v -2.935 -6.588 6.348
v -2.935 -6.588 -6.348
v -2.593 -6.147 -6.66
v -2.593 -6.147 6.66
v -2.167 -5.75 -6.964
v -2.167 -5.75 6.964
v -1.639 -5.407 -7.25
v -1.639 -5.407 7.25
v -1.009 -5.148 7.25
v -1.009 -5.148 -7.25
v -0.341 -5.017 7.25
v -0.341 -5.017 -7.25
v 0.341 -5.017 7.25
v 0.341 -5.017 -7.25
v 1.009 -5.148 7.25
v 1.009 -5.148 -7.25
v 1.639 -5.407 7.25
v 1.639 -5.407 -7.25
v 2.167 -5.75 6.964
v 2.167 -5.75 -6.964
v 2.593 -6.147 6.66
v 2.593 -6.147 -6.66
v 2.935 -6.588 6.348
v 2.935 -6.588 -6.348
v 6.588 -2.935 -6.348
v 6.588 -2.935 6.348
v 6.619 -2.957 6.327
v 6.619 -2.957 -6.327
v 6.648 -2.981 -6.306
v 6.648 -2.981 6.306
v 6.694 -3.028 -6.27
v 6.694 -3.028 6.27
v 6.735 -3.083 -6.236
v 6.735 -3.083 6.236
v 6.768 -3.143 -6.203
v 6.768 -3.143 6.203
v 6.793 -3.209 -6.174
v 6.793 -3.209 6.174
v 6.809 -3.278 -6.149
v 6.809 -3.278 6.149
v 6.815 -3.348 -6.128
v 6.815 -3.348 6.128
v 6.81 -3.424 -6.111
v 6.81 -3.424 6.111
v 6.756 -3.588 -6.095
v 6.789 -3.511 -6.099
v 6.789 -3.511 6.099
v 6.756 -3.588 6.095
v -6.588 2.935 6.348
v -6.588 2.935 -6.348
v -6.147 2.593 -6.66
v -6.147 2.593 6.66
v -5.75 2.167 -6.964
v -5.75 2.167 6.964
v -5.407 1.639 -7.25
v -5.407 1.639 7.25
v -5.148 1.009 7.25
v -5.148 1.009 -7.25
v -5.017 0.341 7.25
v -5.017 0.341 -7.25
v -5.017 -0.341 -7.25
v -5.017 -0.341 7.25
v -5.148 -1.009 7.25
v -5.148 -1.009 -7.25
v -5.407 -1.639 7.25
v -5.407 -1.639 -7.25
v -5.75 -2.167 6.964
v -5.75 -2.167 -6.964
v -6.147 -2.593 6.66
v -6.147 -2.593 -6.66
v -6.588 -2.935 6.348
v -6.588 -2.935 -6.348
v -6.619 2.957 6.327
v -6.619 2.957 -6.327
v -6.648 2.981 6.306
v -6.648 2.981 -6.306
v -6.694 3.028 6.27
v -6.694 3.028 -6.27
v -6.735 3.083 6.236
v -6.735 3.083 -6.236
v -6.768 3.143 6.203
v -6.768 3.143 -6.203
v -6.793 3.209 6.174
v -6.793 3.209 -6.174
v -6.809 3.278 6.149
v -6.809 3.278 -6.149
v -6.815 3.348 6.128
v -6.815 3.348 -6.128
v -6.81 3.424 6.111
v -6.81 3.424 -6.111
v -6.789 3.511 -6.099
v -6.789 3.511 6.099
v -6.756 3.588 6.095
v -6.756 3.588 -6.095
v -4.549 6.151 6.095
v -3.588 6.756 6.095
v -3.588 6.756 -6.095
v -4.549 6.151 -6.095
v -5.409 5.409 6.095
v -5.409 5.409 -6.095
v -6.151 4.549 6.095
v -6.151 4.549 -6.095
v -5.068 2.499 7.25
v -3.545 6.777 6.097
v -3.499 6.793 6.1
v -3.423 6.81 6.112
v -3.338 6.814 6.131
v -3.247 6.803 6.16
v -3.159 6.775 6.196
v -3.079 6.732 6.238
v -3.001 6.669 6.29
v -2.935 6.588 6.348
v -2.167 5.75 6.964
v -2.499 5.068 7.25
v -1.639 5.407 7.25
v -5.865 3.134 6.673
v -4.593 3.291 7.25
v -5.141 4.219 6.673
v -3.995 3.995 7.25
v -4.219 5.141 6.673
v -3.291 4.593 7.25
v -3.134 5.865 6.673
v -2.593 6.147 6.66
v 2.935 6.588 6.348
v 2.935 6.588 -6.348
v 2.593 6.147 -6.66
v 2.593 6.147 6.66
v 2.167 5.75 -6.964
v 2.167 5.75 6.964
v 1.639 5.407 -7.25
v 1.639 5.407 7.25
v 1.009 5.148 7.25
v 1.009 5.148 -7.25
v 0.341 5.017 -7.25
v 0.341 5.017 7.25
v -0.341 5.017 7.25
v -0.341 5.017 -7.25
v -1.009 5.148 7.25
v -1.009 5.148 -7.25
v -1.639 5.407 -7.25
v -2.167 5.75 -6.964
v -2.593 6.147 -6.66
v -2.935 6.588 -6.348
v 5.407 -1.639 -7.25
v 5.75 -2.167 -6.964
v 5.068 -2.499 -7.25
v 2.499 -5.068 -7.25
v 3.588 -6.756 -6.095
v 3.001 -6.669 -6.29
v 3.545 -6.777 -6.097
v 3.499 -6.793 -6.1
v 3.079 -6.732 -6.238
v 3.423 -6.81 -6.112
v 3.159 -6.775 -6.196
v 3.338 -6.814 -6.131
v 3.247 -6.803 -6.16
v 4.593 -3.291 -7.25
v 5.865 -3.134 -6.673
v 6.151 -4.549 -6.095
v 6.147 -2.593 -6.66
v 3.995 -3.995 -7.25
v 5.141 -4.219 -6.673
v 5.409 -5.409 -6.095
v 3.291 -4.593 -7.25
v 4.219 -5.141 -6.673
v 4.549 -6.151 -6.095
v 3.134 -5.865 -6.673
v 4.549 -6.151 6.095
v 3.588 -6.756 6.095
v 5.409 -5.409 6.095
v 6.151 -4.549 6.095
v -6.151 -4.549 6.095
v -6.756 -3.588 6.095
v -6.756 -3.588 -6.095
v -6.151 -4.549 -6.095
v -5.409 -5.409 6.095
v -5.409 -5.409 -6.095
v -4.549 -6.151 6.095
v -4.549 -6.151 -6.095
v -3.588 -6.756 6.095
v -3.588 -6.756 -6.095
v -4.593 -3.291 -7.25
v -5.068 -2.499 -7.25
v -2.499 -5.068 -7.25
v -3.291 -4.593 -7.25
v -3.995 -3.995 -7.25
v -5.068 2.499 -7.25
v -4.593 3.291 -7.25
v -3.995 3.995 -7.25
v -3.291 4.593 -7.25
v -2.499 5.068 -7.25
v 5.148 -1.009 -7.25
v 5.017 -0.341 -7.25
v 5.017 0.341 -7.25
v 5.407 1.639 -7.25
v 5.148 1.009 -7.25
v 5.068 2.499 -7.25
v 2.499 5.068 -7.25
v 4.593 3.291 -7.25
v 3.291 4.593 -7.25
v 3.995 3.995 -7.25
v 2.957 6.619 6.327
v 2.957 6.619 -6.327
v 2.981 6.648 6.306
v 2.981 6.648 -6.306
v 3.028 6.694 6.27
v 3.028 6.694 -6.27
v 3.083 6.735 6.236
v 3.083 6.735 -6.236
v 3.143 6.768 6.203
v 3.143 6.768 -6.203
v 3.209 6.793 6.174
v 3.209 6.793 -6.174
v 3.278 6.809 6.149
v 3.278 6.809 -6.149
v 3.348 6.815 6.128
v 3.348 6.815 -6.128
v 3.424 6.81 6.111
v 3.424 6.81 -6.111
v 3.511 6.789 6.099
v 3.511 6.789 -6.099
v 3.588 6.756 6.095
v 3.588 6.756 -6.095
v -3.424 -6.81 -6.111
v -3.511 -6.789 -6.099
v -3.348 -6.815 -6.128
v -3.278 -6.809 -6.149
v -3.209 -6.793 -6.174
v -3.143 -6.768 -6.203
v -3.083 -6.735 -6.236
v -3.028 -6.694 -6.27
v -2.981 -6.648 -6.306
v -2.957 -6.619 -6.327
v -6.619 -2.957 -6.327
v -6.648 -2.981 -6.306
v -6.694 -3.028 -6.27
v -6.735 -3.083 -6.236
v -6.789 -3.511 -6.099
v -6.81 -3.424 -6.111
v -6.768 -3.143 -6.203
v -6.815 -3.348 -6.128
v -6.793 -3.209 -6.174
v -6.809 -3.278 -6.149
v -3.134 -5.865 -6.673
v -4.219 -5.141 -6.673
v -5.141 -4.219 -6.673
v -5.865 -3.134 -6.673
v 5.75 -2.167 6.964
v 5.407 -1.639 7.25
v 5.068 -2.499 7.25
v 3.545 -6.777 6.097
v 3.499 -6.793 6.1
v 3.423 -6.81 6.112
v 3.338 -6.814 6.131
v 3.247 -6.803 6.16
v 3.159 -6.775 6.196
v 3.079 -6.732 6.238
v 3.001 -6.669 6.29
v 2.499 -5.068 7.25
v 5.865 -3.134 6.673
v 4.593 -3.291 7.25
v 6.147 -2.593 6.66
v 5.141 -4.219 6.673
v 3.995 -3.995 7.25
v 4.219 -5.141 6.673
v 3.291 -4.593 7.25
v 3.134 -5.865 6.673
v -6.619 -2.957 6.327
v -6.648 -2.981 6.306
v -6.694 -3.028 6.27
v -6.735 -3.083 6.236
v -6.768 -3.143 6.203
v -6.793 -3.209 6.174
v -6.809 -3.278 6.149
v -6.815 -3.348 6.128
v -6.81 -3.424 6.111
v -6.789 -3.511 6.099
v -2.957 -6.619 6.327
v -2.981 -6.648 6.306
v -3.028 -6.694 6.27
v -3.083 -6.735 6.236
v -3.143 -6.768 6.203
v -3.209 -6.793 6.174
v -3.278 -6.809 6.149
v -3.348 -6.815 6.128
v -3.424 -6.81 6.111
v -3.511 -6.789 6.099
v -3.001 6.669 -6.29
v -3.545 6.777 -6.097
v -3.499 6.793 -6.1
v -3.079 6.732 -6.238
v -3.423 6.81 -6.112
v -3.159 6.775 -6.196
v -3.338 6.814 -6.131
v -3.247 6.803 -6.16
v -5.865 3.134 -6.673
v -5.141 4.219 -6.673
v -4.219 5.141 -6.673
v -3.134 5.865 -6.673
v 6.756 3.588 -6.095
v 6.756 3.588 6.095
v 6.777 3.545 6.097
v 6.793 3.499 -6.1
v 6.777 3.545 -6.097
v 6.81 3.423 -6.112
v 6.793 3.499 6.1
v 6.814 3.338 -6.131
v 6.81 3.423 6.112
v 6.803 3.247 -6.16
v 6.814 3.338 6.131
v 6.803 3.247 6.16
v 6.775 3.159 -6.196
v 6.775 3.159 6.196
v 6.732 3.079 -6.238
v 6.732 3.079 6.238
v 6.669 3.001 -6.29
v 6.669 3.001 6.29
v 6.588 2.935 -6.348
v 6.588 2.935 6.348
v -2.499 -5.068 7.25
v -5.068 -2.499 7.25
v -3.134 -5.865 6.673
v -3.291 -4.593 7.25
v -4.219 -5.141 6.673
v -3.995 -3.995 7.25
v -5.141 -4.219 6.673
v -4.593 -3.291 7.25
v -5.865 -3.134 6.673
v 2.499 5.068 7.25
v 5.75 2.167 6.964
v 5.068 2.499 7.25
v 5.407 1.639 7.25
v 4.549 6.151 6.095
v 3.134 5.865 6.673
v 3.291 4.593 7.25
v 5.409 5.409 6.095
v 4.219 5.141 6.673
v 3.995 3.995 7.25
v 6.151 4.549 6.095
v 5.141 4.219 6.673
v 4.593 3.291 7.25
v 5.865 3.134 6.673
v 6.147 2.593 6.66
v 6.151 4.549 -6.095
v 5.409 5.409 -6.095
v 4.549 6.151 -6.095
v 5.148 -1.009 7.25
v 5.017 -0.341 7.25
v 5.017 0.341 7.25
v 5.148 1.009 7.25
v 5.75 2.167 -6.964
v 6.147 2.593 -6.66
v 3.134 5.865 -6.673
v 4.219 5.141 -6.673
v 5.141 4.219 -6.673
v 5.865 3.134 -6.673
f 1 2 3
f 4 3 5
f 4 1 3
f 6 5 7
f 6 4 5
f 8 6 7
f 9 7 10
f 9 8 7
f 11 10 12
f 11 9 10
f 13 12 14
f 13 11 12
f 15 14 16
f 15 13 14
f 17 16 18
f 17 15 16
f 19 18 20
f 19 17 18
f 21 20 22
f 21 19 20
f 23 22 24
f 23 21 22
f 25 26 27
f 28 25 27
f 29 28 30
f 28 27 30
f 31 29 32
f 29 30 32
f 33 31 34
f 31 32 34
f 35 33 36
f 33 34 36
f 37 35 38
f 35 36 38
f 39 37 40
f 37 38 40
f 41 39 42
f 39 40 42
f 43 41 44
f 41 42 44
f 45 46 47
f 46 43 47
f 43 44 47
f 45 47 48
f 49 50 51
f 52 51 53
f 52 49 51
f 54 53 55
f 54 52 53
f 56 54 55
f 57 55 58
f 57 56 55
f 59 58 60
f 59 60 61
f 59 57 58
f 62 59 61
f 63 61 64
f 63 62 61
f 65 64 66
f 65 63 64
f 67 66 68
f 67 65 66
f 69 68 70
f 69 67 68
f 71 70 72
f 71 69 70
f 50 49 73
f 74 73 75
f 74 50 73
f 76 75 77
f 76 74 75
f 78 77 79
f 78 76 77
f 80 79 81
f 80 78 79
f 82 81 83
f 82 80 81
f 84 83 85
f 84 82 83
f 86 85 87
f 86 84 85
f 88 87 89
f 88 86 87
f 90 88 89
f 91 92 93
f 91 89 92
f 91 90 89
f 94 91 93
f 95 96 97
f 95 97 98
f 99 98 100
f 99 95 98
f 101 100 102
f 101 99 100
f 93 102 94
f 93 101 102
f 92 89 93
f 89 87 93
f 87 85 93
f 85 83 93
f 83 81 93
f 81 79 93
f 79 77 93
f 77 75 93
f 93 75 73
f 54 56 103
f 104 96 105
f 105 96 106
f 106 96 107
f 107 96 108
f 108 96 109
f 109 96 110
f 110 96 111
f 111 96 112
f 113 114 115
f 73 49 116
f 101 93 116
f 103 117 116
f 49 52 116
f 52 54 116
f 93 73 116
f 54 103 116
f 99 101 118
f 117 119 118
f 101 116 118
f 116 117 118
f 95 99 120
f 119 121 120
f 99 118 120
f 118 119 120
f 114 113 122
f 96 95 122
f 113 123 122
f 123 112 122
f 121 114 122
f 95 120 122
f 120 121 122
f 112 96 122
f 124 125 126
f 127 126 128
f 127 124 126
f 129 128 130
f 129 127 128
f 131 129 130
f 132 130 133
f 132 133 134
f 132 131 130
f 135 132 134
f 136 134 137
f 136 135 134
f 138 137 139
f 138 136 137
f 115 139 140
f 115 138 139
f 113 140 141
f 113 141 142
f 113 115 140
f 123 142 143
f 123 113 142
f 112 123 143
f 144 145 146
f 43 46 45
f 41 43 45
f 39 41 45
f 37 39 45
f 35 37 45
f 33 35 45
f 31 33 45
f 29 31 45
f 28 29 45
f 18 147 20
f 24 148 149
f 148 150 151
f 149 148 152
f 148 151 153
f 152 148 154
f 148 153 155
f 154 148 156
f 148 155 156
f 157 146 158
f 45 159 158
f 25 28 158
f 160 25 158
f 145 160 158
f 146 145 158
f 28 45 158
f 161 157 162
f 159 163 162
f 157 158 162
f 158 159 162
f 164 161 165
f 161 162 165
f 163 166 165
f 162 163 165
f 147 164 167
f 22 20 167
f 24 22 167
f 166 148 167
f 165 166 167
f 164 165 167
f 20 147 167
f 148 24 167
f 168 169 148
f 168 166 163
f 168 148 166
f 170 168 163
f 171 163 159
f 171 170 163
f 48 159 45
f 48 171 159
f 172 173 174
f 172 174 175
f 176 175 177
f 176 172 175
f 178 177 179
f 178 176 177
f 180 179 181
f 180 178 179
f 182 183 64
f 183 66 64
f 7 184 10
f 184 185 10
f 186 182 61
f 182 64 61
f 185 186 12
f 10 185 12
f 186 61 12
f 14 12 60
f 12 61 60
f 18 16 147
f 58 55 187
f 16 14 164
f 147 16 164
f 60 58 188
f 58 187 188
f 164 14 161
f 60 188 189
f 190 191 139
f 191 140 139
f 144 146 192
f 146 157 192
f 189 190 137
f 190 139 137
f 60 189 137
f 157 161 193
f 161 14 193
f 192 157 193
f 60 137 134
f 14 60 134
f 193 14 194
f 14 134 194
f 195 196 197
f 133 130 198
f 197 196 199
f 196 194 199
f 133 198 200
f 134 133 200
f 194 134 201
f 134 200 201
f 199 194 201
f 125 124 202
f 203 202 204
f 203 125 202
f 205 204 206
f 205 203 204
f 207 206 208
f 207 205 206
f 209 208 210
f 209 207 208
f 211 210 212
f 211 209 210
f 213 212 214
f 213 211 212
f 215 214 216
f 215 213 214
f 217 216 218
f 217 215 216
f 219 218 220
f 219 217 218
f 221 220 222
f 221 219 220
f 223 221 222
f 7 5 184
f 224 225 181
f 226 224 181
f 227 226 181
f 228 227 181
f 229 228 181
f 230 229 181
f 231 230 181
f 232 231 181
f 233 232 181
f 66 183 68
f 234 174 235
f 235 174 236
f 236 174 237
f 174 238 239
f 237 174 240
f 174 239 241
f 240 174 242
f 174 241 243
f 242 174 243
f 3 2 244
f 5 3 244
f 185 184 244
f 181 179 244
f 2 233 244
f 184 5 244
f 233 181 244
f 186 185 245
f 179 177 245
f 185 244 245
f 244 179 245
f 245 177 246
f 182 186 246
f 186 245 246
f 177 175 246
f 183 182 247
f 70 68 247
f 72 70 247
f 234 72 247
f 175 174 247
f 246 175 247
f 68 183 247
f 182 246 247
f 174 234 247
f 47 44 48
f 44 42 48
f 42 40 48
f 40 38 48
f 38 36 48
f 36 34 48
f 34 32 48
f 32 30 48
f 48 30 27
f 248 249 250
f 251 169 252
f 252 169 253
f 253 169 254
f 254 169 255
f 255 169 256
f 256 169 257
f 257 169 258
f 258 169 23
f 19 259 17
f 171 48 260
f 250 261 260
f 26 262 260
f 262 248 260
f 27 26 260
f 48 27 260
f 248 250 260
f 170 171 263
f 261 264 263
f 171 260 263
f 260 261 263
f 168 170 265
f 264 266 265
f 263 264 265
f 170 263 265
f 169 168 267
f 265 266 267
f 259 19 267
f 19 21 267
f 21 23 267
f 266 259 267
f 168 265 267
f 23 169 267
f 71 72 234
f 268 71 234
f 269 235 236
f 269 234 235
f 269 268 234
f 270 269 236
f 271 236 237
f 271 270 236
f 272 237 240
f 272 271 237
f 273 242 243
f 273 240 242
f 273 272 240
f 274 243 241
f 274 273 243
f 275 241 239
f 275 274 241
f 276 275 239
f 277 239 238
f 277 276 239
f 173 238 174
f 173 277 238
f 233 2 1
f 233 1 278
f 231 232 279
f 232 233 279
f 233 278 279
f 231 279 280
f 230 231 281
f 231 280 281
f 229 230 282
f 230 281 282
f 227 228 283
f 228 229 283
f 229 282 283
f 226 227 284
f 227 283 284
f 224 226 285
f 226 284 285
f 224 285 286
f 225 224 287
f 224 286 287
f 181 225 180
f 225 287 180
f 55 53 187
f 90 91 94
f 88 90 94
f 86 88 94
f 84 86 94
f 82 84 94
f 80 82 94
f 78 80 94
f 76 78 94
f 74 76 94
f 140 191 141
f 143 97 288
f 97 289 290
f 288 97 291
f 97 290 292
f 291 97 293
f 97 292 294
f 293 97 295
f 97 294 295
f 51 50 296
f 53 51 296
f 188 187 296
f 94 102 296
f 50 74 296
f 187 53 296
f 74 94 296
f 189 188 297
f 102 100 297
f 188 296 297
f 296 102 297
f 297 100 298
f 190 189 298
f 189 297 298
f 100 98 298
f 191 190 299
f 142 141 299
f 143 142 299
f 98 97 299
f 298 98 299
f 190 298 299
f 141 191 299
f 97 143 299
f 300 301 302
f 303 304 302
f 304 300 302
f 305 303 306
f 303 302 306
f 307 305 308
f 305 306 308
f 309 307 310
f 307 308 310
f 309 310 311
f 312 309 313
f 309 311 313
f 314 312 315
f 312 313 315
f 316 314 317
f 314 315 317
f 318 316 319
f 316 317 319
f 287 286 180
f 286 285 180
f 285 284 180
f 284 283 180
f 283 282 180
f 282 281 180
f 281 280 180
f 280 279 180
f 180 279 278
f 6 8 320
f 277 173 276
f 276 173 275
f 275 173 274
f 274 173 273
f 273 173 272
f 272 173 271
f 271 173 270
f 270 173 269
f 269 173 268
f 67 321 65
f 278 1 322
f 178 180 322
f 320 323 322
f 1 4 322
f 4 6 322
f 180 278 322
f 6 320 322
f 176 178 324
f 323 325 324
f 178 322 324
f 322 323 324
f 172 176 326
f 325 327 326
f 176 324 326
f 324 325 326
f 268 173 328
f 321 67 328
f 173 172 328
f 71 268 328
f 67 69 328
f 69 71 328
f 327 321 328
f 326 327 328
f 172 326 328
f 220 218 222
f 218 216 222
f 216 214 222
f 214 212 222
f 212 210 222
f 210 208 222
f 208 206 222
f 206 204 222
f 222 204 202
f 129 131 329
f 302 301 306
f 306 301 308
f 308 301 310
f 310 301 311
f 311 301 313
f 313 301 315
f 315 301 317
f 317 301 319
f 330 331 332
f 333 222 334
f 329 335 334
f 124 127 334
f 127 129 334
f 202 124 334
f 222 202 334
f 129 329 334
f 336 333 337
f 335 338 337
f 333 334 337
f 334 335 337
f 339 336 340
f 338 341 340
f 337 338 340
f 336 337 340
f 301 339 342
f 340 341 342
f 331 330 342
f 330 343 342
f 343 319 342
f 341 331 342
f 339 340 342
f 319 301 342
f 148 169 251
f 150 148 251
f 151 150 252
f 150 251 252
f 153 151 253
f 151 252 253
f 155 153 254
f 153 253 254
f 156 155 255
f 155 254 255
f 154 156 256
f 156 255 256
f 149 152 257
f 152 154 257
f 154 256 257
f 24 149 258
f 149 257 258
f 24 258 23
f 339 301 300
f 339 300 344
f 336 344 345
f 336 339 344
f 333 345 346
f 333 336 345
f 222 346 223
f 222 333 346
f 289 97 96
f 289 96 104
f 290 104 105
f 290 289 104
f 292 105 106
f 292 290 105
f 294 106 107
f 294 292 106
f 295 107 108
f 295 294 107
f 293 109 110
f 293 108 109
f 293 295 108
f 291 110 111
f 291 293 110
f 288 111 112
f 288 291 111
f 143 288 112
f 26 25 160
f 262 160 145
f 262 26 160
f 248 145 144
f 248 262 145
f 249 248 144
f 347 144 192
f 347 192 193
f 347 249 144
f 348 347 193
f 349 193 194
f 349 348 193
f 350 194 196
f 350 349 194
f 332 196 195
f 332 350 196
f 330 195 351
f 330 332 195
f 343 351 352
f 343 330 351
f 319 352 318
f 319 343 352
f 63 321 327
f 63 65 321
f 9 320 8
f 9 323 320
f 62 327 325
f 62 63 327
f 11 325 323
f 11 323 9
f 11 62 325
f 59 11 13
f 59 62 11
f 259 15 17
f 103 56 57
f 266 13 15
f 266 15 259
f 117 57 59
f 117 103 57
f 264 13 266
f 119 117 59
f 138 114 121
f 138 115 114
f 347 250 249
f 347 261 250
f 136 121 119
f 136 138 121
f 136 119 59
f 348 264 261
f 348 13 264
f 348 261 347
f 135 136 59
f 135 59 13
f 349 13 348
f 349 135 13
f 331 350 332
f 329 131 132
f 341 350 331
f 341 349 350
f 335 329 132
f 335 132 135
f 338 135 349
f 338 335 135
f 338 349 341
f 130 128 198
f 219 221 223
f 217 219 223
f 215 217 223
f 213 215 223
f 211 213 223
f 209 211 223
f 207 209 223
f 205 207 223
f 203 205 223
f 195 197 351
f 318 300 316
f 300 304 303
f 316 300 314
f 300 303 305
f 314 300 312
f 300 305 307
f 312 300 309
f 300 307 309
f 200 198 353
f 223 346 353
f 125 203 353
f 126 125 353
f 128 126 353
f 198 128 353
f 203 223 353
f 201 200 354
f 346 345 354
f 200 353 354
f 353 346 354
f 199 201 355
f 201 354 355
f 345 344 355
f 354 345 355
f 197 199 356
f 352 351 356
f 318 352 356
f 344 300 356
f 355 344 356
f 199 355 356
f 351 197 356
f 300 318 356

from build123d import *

# Parameters (mm, degrees)
F1_DEPTH = 7.25
F2_R     = 0.5


with BuildPart() as f1:
    # F0 (on Top) → F1 (new body, symmetric)
    with BuildSketch(Plane.XY):
        with BuildLine():
            ThreePointArc((-6.9704381548, 3.1520615364), (-5, 0), (-6.9704381548, -3.1520615364))
            ThreePointArc((-6.9704381548, -3.1520615364), (-5.4093668761, -5.4093668761), (-3.1520615364, -6.9704381548))
            ThreePointArc((-3.1520615364, -6.9704381548), (0, -5), (3.1520615364, -6.9704381548))
            ThreePointArc((3.1520615364, -6.9704381548), (5.4093668761, -5.4093668761), (6.9704381548, -3.1520615364))
            ThreePointArc((6.9704381548, -3.1520615364), (5, 0), (6.9704381548, 3.1520615364))
            ThreePointArc((6.9704381548, 3.1520615364), (5.4093668761, 5.4093668761), (3.1520615364, 6.9704381548))
            ThreePointArc((3.1520615364, 6.9704381548), (0, 5), (-3.1520615364, 6.9704381548))
            ThreePointArc((-3.1520615364, 6.9704381548), (-5.4093668761, 5.4093668761), (-6.9704381548, 3.1520615364))
        make_face()
    extrude(amount=F1_DEPTH, both=True)

    # F2
    f2_edges = [f1.edges().sort_by_distance(p)[0] for p in [
        (-3.152062, 6.970438, 0),
        (-6.970438, 3.152062, 0),
        (-6.970438, -3.152062, 0),
        (-3.152062, -6.970438, 0),
        (3.152062, -6.970438, 0),
        (6.970438, -3.152062, 0),
        (6.970438, 3.152062, 0),
        (3.152062, 6.970438, 0),
    ]]
    fillet(f2_edges, radius=F2_R)

    # F3 (on Right) → F4 (revolve, cut)
    with BuildSketch(Plane.YZ):
        Polygon((-7.65, 6.0952994616), (-5.65, 7.25), (-7.65, 7.25), align=None)
        Polygon((-5.65, -7.25), (-7.65, -6.0952994616), (-7.65, -7.25), align=None)
    revolve(axis=Axis((0, 0, 0.0045555644), (0, 0, -1)), mode=Mode.SUBTRACT)


solid = f1.part
